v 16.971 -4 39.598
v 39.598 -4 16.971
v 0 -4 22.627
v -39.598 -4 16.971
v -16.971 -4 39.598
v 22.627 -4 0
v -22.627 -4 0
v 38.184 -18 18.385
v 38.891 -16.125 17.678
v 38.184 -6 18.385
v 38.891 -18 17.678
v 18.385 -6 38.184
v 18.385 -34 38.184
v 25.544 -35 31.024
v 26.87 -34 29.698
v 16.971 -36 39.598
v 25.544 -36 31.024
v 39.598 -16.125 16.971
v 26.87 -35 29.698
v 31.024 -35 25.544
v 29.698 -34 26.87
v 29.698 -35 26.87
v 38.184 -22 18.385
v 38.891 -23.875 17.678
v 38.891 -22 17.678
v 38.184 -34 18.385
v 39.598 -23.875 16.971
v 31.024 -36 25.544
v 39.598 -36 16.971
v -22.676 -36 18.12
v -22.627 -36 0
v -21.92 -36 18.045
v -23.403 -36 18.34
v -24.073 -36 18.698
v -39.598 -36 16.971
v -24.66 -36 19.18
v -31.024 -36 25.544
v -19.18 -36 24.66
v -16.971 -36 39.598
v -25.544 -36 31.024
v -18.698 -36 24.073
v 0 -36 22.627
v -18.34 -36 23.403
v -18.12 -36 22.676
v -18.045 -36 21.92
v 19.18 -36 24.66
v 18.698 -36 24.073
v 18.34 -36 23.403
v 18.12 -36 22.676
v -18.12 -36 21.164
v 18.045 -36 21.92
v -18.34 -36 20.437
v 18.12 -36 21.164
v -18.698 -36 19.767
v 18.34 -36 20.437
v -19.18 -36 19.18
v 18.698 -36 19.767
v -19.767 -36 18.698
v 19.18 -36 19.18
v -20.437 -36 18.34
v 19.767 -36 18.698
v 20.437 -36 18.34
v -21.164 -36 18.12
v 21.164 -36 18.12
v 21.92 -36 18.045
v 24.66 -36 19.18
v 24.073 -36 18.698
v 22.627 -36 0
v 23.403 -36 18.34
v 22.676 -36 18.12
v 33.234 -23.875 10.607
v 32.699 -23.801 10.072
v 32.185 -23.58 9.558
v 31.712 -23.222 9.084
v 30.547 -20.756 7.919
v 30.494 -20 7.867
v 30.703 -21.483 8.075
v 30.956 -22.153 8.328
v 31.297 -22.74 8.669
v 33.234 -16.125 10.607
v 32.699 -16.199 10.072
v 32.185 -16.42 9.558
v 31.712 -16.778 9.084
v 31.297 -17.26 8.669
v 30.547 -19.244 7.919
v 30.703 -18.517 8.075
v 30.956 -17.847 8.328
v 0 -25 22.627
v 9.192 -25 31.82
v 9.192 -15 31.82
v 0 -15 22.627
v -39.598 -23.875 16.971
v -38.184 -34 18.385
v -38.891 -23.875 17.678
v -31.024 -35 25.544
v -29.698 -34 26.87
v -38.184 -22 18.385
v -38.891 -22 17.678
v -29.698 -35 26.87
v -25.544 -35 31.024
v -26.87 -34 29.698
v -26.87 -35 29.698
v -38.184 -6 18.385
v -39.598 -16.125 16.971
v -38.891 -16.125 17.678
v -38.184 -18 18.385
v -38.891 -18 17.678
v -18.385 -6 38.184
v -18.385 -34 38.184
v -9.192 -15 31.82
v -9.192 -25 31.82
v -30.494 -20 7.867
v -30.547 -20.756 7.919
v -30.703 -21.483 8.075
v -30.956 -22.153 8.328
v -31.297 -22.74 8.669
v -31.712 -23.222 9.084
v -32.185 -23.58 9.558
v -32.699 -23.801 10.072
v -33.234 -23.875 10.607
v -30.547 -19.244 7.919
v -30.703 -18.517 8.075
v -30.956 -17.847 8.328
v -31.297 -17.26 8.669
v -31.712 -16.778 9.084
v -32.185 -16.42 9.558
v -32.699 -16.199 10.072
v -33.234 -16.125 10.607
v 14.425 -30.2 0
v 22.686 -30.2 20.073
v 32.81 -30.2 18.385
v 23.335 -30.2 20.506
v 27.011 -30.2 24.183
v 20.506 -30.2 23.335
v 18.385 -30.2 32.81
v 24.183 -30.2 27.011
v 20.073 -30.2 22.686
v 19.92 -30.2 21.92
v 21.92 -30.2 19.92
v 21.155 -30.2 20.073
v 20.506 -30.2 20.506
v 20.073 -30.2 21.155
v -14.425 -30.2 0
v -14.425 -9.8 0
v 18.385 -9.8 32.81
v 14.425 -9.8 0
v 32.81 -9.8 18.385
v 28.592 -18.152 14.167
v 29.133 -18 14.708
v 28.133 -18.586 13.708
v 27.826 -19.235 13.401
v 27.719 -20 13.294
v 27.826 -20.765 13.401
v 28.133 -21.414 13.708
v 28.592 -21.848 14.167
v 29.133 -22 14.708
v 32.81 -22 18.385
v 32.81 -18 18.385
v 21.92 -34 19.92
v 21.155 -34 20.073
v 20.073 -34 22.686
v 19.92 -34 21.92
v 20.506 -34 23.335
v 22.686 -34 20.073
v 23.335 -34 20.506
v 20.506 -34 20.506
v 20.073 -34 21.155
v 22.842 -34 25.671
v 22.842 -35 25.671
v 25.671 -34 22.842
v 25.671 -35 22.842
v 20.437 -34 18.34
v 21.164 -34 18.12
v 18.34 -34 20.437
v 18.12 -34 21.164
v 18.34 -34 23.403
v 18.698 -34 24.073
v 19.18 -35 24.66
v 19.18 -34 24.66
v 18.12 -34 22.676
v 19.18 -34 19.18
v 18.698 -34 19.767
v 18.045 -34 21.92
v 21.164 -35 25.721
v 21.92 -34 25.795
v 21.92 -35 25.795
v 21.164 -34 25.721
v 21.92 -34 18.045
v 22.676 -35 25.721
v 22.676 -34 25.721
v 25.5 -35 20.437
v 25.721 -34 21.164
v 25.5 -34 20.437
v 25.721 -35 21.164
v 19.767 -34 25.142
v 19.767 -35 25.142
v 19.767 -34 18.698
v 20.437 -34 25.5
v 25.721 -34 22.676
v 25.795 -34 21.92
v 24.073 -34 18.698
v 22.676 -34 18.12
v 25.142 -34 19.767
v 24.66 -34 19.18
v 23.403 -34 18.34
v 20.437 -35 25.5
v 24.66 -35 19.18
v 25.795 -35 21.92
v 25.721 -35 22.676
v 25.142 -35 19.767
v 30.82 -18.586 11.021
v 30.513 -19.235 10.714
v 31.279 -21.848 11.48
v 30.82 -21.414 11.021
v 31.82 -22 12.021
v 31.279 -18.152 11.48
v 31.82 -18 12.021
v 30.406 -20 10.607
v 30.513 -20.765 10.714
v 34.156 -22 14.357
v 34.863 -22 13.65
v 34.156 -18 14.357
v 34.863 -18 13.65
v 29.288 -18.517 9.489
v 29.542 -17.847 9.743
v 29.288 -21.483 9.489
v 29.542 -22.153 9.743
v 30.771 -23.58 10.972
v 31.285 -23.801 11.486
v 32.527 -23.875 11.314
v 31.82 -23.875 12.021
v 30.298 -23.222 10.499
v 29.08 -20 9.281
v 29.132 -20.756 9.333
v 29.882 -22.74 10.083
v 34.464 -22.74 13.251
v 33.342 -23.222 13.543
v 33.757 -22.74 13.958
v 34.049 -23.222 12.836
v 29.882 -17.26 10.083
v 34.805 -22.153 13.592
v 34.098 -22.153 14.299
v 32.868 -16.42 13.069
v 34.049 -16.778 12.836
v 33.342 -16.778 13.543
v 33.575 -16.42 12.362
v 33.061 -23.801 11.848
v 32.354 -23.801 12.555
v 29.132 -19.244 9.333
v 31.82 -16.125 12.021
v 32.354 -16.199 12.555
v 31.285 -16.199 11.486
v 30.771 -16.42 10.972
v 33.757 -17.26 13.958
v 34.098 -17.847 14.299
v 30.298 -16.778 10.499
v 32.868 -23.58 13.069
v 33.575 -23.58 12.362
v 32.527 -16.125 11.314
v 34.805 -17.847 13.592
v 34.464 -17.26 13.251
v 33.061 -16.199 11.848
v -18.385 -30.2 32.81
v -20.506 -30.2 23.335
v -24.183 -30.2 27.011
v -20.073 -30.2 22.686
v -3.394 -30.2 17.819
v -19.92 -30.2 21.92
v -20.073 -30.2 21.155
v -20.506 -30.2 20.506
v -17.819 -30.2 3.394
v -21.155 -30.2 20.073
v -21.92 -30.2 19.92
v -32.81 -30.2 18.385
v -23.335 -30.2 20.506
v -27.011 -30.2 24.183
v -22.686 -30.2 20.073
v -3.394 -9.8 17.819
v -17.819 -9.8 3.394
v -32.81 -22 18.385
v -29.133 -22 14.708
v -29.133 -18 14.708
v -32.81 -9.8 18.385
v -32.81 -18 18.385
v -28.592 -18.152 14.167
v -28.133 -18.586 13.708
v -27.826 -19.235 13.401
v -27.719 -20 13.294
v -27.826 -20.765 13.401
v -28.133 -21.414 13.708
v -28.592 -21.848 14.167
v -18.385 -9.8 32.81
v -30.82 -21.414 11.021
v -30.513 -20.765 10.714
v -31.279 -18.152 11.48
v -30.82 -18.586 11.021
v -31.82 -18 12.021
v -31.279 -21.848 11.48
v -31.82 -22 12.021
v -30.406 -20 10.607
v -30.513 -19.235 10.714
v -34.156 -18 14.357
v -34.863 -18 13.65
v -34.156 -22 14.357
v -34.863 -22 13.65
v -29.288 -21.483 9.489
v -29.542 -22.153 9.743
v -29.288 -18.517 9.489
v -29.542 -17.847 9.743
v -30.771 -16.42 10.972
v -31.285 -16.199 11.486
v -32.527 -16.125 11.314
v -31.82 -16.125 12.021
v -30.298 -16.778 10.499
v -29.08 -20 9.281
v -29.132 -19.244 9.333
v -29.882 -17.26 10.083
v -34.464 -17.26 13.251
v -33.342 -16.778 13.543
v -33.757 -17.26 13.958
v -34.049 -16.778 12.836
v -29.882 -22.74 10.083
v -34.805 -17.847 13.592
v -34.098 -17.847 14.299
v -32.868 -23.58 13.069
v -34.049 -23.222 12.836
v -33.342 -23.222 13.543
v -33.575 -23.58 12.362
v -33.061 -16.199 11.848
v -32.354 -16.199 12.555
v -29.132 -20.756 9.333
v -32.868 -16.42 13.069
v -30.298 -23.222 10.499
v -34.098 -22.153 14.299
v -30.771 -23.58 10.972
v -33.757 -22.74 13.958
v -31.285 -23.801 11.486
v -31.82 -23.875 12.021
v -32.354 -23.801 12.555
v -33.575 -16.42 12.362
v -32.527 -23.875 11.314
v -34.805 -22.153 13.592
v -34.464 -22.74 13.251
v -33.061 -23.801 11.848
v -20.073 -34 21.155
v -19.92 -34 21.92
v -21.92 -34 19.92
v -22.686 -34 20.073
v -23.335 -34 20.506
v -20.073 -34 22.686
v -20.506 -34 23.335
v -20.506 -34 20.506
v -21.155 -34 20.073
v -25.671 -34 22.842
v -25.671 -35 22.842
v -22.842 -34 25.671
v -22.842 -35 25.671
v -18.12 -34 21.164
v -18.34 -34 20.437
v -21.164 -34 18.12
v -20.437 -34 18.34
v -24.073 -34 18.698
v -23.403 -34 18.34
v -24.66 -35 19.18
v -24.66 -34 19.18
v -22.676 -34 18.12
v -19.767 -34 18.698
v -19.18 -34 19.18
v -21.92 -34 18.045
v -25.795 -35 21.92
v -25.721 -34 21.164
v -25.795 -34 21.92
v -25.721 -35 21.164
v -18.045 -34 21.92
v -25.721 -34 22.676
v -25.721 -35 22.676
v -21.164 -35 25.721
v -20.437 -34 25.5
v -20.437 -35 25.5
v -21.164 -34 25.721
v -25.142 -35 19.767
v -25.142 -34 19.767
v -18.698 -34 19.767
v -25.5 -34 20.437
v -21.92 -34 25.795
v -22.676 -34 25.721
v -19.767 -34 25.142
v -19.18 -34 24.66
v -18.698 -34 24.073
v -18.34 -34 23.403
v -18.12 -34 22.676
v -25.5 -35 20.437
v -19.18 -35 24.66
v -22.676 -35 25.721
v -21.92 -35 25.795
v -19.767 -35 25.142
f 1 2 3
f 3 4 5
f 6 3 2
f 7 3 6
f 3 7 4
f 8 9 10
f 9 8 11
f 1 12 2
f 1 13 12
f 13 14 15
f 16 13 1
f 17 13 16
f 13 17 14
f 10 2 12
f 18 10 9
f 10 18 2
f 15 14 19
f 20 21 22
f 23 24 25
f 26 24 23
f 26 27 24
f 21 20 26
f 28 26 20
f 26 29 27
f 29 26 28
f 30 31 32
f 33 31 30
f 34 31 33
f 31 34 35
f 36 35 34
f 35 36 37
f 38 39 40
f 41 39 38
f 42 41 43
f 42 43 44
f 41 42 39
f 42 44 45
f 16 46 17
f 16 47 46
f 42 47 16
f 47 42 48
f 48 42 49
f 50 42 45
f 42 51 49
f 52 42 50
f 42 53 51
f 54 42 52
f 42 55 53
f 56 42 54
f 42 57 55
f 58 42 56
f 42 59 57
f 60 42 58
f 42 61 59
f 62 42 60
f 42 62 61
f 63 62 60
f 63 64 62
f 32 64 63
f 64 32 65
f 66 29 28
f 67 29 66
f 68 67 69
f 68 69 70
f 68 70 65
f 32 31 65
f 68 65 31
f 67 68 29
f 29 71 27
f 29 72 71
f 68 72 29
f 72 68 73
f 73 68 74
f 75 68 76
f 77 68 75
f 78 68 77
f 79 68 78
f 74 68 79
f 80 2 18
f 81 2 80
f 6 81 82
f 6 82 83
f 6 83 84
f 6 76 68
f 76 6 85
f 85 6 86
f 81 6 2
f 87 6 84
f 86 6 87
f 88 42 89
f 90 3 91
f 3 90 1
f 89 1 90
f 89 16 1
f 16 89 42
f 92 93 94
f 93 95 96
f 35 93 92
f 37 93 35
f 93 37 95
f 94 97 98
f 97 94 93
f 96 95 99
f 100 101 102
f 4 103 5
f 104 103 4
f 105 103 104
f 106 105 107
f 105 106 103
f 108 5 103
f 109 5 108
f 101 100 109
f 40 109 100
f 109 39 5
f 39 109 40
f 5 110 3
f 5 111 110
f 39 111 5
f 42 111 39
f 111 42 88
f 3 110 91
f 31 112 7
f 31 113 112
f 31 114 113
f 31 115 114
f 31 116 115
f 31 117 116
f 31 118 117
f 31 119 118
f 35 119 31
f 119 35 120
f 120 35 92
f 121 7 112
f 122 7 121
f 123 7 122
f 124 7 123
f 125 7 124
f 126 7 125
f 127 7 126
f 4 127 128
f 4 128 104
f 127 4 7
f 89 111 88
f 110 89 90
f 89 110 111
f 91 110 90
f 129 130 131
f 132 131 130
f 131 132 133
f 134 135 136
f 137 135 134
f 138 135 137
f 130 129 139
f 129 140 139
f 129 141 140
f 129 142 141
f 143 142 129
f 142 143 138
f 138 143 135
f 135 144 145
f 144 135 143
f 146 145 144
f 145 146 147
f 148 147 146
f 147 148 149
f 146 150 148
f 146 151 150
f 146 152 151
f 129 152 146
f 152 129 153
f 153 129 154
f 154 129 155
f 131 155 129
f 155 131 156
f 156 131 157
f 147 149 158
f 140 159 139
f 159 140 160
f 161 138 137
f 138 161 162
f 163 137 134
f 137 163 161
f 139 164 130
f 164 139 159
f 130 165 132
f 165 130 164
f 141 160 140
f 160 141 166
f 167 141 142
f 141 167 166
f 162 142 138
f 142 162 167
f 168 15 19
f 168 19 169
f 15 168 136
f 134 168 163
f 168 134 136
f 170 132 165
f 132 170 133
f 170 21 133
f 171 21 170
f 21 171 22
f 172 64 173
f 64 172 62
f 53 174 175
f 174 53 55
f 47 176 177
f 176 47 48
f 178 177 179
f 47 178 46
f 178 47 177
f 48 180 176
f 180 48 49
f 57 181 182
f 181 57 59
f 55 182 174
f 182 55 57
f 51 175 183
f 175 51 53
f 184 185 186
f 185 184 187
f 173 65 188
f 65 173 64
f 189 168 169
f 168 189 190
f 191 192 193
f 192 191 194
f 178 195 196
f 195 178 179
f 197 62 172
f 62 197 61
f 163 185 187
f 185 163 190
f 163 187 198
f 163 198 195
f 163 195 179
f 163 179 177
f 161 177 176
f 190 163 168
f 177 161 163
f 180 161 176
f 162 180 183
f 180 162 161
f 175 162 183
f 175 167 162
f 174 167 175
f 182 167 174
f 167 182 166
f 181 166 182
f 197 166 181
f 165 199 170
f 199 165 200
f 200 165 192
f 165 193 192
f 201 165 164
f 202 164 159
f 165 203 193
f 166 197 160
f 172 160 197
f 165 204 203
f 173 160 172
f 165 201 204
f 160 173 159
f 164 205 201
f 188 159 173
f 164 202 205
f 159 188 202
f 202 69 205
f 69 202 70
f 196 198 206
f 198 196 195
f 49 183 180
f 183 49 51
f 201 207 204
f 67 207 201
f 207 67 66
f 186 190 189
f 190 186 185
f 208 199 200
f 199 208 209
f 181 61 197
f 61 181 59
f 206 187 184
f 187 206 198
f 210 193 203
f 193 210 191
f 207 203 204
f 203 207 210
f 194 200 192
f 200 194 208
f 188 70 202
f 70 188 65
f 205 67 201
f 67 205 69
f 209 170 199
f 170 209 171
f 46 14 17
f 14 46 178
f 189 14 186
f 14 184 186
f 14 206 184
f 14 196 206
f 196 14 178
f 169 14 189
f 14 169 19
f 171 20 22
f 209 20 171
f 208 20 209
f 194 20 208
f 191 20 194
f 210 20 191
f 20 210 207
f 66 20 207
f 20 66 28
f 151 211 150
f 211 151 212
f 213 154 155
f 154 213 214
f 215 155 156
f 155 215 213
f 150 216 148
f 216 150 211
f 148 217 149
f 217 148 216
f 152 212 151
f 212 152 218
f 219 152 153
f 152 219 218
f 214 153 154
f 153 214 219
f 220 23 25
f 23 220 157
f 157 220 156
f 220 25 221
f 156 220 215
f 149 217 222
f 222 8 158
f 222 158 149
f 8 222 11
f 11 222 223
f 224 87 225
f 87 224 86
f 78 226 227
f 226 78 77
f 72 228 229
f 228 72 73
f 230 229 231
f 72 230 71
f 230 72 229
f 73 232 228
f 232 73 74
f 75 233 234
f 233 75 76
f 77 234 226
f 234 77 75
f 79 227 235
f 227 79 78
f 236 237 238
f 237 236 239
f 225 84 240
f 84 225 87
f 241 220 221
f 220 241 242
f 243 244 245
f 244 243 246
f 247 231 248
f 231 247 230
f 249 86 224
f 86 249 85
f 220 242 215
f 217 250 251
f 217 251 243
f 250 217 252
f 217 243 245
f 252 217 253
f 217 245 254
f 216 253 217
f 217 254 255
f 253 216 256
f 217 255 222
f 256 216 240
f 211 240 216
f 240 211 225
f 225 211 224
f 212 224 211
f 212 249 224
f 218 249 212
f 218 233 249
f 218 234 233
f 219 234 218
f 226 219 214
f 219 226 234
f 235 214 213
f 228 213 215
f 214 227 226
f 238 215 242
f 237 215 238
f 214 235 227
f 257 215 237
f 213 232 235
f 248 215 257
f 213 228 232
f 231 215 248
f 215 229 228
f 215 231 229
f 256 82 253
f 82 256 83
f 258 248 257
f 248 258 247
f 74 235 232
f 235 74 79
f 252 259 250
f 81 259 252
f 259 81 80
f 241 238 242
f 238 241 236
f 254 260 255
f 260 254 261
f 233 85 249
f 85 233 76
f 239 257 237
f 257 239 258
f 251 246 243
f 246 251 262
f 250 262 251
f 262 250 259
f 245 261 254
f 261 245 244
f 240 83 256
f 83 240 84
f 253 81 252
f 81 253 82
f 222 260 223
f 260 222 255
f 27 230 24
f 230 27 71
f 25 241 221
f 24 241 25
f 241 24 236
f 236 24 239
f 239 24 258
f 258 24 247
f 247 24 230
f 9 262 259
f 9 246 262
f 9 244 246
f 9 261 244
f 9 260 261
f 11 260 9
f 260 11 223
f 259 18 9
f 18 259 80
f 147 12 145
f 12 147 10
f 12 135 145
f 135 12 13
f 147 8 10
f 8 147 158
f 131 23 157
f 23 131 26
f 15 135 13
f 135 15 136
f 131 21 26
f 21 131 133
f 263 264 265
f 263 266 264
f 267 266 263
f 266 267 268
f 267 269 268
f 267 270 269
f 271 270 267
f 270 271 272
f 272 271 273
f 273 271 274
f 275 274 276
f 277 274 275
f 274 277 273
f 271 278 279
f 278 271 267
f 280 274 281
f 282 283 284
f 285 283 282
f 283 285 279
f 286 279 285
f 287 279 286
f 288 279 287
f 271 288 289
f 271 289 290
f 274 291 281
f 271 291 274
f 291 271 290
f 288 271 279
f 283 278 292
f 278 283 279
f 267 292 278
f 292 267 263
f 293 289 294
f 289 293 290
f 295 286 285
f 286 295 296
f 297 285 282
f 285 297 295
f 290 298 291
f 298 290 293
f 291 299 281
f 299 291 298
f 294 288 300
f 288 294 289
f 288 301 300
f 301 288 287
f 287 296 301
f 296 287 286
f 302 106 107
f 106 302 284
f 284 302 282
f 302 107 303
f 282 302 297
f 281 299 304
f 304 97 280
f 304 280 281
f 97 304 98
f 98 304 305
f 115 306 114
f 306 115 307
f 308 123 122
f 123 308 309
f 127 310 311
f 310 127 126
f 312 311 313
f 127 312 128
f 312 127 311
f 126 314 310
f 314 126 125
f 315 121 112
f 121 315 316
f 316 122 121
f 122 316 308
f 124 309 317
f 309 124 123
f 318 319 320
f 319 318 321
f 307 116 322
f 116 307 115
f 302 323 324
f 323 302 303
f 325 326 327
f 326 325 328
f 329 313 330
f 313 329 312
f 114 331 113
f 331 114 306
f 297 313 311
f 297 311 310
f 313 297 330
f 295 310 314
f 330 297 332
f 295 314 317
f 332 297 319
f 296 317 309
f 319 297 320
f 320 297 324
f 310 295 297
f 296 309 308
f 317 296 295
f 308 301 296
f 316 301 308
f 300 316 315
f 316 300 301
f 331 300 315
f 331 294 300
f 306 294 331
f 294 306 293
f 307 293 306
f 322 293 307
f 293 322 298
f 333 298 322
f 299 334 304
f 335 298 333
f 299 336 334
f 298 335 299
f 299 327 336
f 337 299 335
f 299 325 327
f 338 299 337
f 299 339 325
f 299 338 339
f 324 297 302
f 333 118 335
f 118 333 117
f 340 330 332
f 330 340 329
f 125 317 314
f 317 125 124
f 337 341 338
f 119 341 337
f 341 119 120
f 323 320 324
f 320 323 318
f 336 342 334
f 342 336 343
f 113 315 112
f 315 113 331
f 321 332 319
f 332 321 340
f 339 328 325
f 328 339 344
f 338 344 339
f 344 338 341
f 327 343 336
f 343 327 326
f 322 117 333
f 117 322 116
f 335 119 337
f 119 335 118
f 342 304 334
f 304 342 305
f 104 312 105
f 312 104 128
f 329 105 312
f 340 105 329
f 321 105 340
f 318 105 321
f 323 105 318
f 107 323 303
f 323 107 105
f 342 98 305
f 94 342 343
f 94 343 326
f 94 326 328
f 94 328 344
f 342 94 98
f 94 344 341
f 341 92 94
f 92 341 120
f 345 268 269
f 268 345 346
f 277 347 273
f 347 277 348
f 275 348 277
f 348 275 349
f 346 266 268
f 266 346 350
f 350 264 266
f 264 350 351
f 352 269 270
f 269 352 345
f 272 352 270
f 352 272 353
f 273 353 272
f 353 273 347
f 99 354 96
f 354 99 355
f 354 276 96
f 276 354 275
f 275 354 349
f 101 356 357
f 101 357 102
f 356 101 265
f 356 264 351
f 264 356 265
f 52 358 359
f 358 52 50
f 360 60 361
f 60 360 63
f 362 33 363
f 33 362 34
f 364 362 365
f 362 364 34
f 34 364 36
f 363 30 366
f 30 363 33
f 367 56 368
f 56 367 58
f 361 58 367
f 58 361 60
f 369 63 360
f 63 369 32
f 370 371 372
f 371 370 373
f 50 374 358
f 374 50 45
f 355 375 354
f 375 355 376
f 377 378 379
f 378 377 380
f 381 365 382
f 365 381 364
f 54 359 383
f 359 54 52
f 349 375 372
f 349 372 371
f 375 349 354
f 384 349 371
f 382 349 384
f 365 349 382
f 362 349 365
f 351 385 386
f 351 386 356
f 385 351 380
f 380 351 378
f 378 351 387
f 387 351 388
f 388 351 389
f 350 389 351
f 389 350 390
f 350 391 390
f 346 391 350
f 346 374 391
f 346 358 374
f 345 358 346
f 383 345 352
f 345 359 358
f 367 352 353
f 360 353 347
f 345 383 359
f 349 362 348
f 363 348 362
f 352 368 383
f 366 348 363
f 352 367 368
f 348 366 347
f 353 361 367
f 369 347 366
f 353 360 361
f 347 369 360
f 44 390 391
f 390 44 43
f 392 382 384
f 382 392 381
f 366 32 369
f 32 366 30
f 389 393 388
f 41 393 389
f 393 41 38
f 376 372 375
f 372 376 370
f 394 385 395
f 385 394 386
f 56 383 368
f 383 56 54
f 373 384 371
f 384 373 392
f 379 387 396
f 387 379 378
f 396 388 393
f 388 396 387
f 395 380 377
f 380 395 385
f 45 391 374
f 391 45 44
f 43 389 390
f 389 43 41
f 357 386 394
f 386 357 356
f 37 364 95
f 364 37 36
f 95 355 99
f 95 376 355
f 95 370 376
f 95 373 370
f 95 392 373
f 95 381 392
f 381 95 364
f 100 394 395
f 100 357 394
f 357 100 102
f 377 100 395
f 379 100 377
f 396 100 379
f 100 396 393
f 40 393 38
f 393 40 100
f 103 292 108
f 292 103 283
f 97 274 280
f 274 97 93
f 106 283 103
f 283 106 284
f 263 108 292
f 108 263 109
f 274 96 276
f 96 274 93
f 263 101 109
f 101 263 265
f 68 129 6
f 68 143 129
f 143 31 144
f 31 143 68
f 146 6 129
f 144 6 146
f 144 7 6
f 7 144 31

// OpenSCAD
// Generated by SolidPython 1.1.3 on 2024-01-27 17:47:54


difference() {
	rotate(a = 90, v = [1, 0, 0]) {
		rotate(a = 45, v = [0, 0, 1]) {
			difference() {
				union() {
					union();
					translate(v = [-20, 0, 20]) {
						rotate(a = [0, 90.0, 0.0]) {
							translate(v = [0, 0, 30.0]) {
								cube(center = true, size = [32.0000000000, 32.0000000000, 60.0]);
							}
						}
					}
					translate(v = [0, 15, 20]) {
						rotate(a = [0, 90.0, 90.0]) {
							translate(v = [0, 0, 12.5]) {
								cube(center = true, size = [32.0000000000, 32.0000000000, 25.0]);
							}
						}
					}
					union() {
						union();
						hull() {
							union() {
								translate(v = [-20, 0, 20]) {
									rotate(a = [0, 90.0, 0.0]) {
										translate(v = [0, 0, 30.0]) {
											cube(center = true, size = [10, 10, 60.0]);
										}
									}
								}
								translate(v = [0, 15, 20]) {
									rotate(a = [0, 90.0, 90.0]) {
										translate(v = [0, 0, 12.5]) {
											cube(center = true, size = [10, 10, 25.0]);
										}
									}
								}
							}
						}
					}
				}
				union() {
					union();
					translate(v = [-20, 0, 20]) {
						rotate(a = [0, 90.0, 0.0]) {
							translate(v = [0, 0, 10]) {
								rotate(a = -90, v = [0, -1, 0]) {
									rotate(a = 90, v = [0, 0, 1]) {
										union() {
											union();
											translate(v = [0, -10, 0]) {
												rotate(a = -90, v = [1, 0, 0]) {
													polyhedron(convexity = 10, faces = [[0, 1, 4], [1, 5, 4], [1, 2, 5], [2, 6, 5], [2, 3, 6], [3, 7, 6], [3, 0, 7], [0, 4, 7], [3, 2, 1, 0], [4, 5, 6, 7]], points = [[-15.0000000000, 15.0000000000, 0.0000000000], [15.0000000000, 15.0000000000, 0.0000000000], [15.0000000000, -15.0000000000, 0.0000000000], [-15.0000000000, -15.0000000000, 0.0000000000], [0.0000000000, 0.0000000000, 15.0000000000], [0.0000000000, 0.0000000000, 15.0000000000], [0.0000000000, 0.0000000000, 15.0000000000], [0.0000000000, 0.0000000000, 15.0000000000]]);
												}
											}
											translate(v = [0, 41.0, 0]) {
												rotate(a = 180, v = [1, 0, 0]) {
													translate(v = [0, -10, 0]) {
														rotate(a = -90, v = [1, 0, 0]) {
															polyhedron(convexity = 10, faces = [[0, 1, 4], [1, 5, 4], [1, 2, 5], [2, 6, 5], [2, 3, 6], [3, 7, 6], [3, 0, 7], [0, 4, 7], [3, 2, 1, 0], [4, 5, 6, 7]], points = [[-15.0000000000, 15.0000000000, 0.0000000000], [15.0000000000, 15.0000000000, 0.0000000000], [15.0000000000, -15.0000000000, 0.0000000000], [-15.0000000000, -15.0000000000, 0.0000000000], [0.0000000000, 0.0000000000, 15.0000000000], [0.0000000000, 0.0000000000, 15.0000000000], [0.0000000000, 0.0000000000, 15.0000000000], [0.0000000000, 0.0000000000, 15.0000000000]]);
														}
													}
												}
											}
											translate(v = [0, -10, 0]) {
												rotate(a = -90, v = [1, 0, 0]) {
													union() {
														polyhedron(convexity = 10, faces = [[0, 1, 5], [1, 6, 5], [1, 2, 6], [2, 7, 6], [2, 3, 7], [3, 8, 7], [3, 4, 8], [4, 9, 8], [4, 0, 9], [0, 5, 9], [4, 3, 2, 1, 0], [5, 6, 7, 8, 9]], points = [[-10.2, 10.2, 0.0], [-10.2, 0.0, 0.0], [-4.3999999999999995, 0.0, 0.0], [-4.3999999999999995, 0.0, 0.0], [0.0, 0.0, 0.0], [-10.2, 10.2, 60.0], [-10.2, 0.0, 60.0], [-4.3999999999999995, 0.0, 60.0], [-4.3999999999999995, 0.0, 60.0], [0.0, 0.0, 60.0]]);
														mirror(v = [0, 1]) {
															polyhedron(convexity = 10, faces = [[0, 1, 5], [1, 6, 5], [1, 2, 6], [2, 7, 6], [2, 3, 7], [3, 8, 7], [3, 4, 8], [4, 9, 8], [4, 0, 9], [0, 5, 9], [4, 3, 2, 1, 0], [5, 6, 7, 8, 9]], points = [[-10.2, 10.2, 0.0], [-10.2, 0.0, 0.0], [-4.3999999999999995, 0.0, 0.0], [-4.3999999999999995, 0.0, 0.0], [0.0, 0.0, 0.0], [-10.2, 10.2, 60.0], [-10.2, 0.0, 60.0], [-4.3999999999999995, 0.0, 60.0], [-4.3999999999999995, 0.0, 60.0], [0.0, 0.0, 60.0]]);
														}
														mirror(v = [1, 1]) {
															union() {
																polyhedron(convexity = 10, faces = [[0, 1, 5], [1, 6, 5], [1, 2, 6], [2, 7, 6], [2, 3, 7], [3, 8, 7], [3, 4, 8], [4, 9, 8], [4, 0, 9], [0, 5, 9], [4, 3, 2, 1, 0], [5, 6, 7, 8, 9]], points = [[-10.2, 10.2, 0.0], [-10.2, 0.0, 0.0], [-4.3999999999999995, 0.0, 0.0], [-4.3999999999999995, 0.0, 0.0], [0.0, 0.0, 0.0], [-10.2, 10.2, 60.0], [-10.2, 0.0, 60.0], [-4.3999999999999995, 0.0, 60.0], [-4.3999999999999995, 0.0, 60.0], [0.0, 0.0, 60.0]]);
																mirror(v = [0, 1]) {
																	polyhedron(convexity = 10, faces = [[0, 1, 5], [1, 6, 5], [1, 2, 6], [2, 7, 6], [2, 3, 7], [3, 8, 7], [3, 4, 8], [4, 9, 8], [4, 0, 9], [0, 5, 9], [4, 3, 2, 1, 0], [5, 6, 7, 8, 9]], points = [[-10.2, 10.2, 0.0], [-10.2, 0.0, 0.0], [-4.3999999999999995, 0.0, 0.0], [-4.3999999999999995, 0.0, 0.0], [0.0, 0.0, 0.0], [-10.2, 10.2, 60.0], [-10.2, 0.0, 60.0], [-4.3999999999999995, 0.0, 60.0], [-4.3999999999999995, 0.0, 60.0], [0.0, 0.0, 60.0]]);
																}
															}
														}
														mirror(v = [1, -1]) {
															union() {
																polyhedron(convexity = 10, faces = [[0, 1, 5], [1, 6, 5], [1, 2, 6], [2, 7, 6], [2, 3, 7], [3, 8, 7], [3, 4, 8], [4, 9, 8], [4, 0, 9], [0, 5, 9], [4, 3, 2, 1, 0], [5, 6, 7, 8, 9]], points = [[-10.2, 10.2, 0.0], [-10.2, 0.0, 0.0], [-4.3999999999999995, 0.0, 0.0], [-4.3999999999999995, 0.0, 0.0], [0.0, 0.0, 0.0], [-10.2, 10.2, 60.0], [-10.2, 0.0, 60.0], [-4.3999999999999995, 0.0, 60.0], [-4.3999999999999995, 0.0, 60.0], [0.0, 0.0, 60.0]]);
																mirror(v = [0, 1]) {
																	polyhedron(convexity = 10, faces = [[0, 1, 5], [1, 6, 5], [1, 2, 6], [2, 7, 6], [2, 3, 7], [3, 8, 7], [3, 4, 8], [4, 9, 8], [4, 0, 9], [0, 5, 9], [4, 3, 2, 1, 0], [5, 6, 7, 8, 9]], points = [[-10.2, 10.2, 0.0], [-10.2, 0.0, 0.0], [-4.3999999999999995, 0.0, 0.0], [-4.3999999999999995, 0.0, 0.0], [0.0, 0.0, 0.0], [-10.2, 10.2, 60.0], [-10.2, 0.0, 60.0], [-4.3999999999999995, 0.0, 60.0], [-4.3999999999999995, 0.0, 60.0], [0.0, 0.0, 60.0]]);
																}
																mirror(v = [1, 1]) {
																	union() {
																		polyhedron(convexity = 10, faces = [[0, 1, 5], [1, 6, 5], [1, 2, 6], [2, 7, 6], [2, 3, 7], [3, 8, 7], [3, 4, 8], [4, 9, 8], [4, 0, 9], [0, 5, 9], [4, 3, 2, 1, 0], [5, 6, 7, 8, 9]], points = [[-10.2, 10.2, 0.0], [-10.2, 0.0, 0.0], [-4.3999999999999995, 0.0, 0.0], [-4.3999999999999995, 0.0, 0.0], [0.0, 0.0, 0.0], [-10.2, 10.2, 60.0], [-10.2, 0.0, 60.0], [-4.3999999999999995, 0.0, 60.0], [-4.3999999999999995, 0.0, 60.0], [0.0, 0.0, 60.0]]);
																		mirror(v = [0, 1]) {
																			polyhedron(convexity = 10, faces = [[0, 1, 5], [1, 6, 5], [1, 2, 6], [2, 7, 6], [2, 3, 7], [3, 8, 7], [3, 4, 8], [4, 9, 8], [4, 0, 9], [0, 5, 9], [4, 3, 2, 1, 0], [5, 6, 7, 8, 9]], points = [[-10.2, 10.2, 0.0], [-10.2, 0.0, 0.0], [-4.3999999999999995, 0.0, 0.0], [-4.3999999999999995, 0.0, 0.0], [0.0, 0.0, 0.0], [-10.2, 10.2, 60.0], [-10.2, 0.0, 60.0], [-4.3999999999999995, 0.0, 60.0], [-4.3999999999999995, 0.0, 60.0], [0.0, 0.0, 60.0]]);
																		}
																	}
																}
															}
														}
													}
												}
											}
											union() {
												union();
												translate(v = [0, 41.0, 0]) {
													rotate(a = 180, v = [1, 0, 0]) {
														union() {
															translate(v = [0, 0, 14]) {
																cylinder($fn = 32, h = 4, r = 3.8750000000);
															}
															translate(v = [-3.8750000000, -12, 15]) {
																cube(size = [7.7500000000, 12, 4]);
															}
															union() {
																cylinder($fn = 16, h = 19, r = 2.0000000000);
																translate(v = [-2.0000000000, -12, 0]) {
																	cube(size = [4, 12, 19]);
																}
															}
															rotate(a = -90, v = [0, 1, 0]) {
																polyhedron(convexity = 10, faces = [[0, 1, 3], [1, 4, 3], [1, 2, 4], [2, 5, 4], [2, 0, 5], [0, 3, 5], [2, 1, 0], [3, 4, 5]], points = [[0.0000000000, -10.0000000000, 0.0000000000], [10.1000000000, -10.0000000000, 10.1000000000], [10.1000000000, -10.0000000000, -10.1000000000], [0.0000000000, 12.0000000000, 0.0000000000], [10.1000000000, 12.0000000000, 10.1000000000], [10.1000000000, 12.0000000000, -10.1000000000]]);
															}
														}
													}
												}
												translate(v = [0, 41.0, 0]) {
													rotate(a = 180, v = [1, 0, 0]) {
														rotate(a = 270, v = [0, 1, 0]) {
															union() {
																translate(v = [0, 0, 14]) {
																	cylinder($fn = 32, h = 4, r = 3.8750000000);
																}
																translate(v = [-3.8750000000, -12, 15]) {
																	cube(size = [7.7500000000, 12, 4]);
																}
																union() {
																	cylinder($fn = 16, h = 19, r = 2.0000000000);
																	translate(v = [-2.0000000000, -12, 0]) {
																		cube(size = [4, 12, 19]);
																	}
																}
																rotate(a = -90, v = [0, 1, 0]) {
																	polyhedron(convexity = 10, faces = [[0, 1, 3], [1, 4, 3], [1, 2, 4], [2, 5, 4], [2, 0, 5], [0, 3, 5], [2, 1, 0], [3, 4, 5]], points = [[0.0000000000, -10.0000000000, 0.0000000000], [10.1000000000, -10.0000000000, 10.1000000000], [10.1000000000, -10.0000000000, -10.1000000000], [0.0000000000, 12.0000000000, 0.0000000000], [10.1000000000, 12.0000000000, 10.1000000000], [10.1000000000, 12.0000000000, -10.1000000000]]);
																}
															}
														}
													}
												}
											}
										}
									}
								}
							}
						}
					}
					translate(v = [0, 15, 20]) {
						rotate(a = [0, 90.0, 90.0]) {
							translate(v = [0, 0, 10]) {
								rotate(a = -90, v = [0, -1, 0]) {
									rotate(a = 90, v = [0, 0, 1]) {
										union() {
											union();
											translate(v = [0, 6.0, 0]) {
												rotate(a = 180, v = [1, 0, 0]) {
													translate(v = [0, -10, 0]) {
														rotate(a = -90, v = [1, 0, 0]) {
															polyhedron(convexity = 10, faces = [[0, 1, 4], [1, 5, 4], [1, 2, 5], [2, 6, 5], [2, 3, 6], [3, 7, 6], [3, 0, 7], [0, 4, 7], [3, 2, 1, 0], [4, 5, 6, 7]], points = [[-15.0000000000, 15.0000000000, 0.0000000000], [15.0000000000, 15.0000000000, 0.0000000000], [15.0000000000, -15.0000000000, 0.0000000000], [-15.0000000000, -15.0000000000, 0.0000000000], [0.0000000000, 0.0000000000, 15.0000000000], [0.0000000000, 0.0000000000, 15.0000000000], [0.0000000000, 0.0000000000, 15.0000000000], [0.0000000000, 0.0000000000, 15.0000000000]]);
														}
													}
												}
											}
											translate(v = [0, -10, 0]) {
												rotate(a = -90, v = [1, 0, 0]) {
													union() {
														polyhedron(convexity = 10, faces = [[0, 1, 5], [1, 6, 5], [1, 2, 6], [2, 7, 6], [2, 3, 7], [3, 8, 7], [3, 4, 8], [4, 9, 8], [4, 0, 9], [0, 5, 9], [4, 3, 2, 1, 0], [5, 6, 7, 8, 9]], points = [[-10.2, 10.2, 0.0], [-10.2, 0.0, 0.0], [-4.3999999999999995, 0.0, 0.0], [-4.3999999999999995, 0.0, 0.0], [0.0, 0.0, 0.0], [-10.2, 10.2, 25.0], [-10.2, 0.0, 25.0], [-4.3999999999999995, 0.0, 25.0], [-4.3999999999999995, 0.0, 25.0], [0.0, 0.0, 25.0]]);
														mirror(v = [0, 1]) {
															polyhedron(convexity = 10, faces = [[0, 1, 5], [1, 6, 5], [1, 2, 6], [2, 7, 6], [2, 3, 7], [3, 8, 7], [3, 4, 8], [4, 9, 8], [4, 0, 9], [0, 5, 9], [4, 3, 2, 1, 0], [5, 6, 7, 8, 9]], points = [[-10.2, 10.2, 0.0], [-10.2, 0.0, 0.0], [-4.3999999999999995, 0.0, 0.0], [-4.3999999999999995, 0.0, 0.0], [0.0, 0.0, 0.0], [-10.2, 10.2, 25.0], [-10.2, 0.0, 25.0], [-4.3999999999999995, 0.0, 25.0], [-4.3999999999999995, 0.0, 25.0], [0.0, 0.0, 25.0]]);
														}
														mirror(v = [1, 1]) {
															union() {
																polyhedron(convexity = 10, faces = [[0, 1, 5], [1, 6, 5], [1, 2, 6], [2, 7, 6], [2, 3, 7], [3, 8, 7], [3, 4, 8], [4, 9, 8], [4, 0, 9], [0, 5, 9], [4, 3, 2, 1, 0], [5, 6, 7, 8, 9]], points = [[-10.2, 10.2, 0.0], [-10.2, 0.0, 0.0], [-4.3999999999999995, 0.0, 0.0], [-4.3999999999999995, 0.0, 0.0], [0.0, 0.0, 0.0], [-10.2, 10.2, 25.0], [-10.2, 0.0, 25.0], [-4.3999999999999995, 0.0, 25.0], [-4.3999999999999995, 0.0, 25.0], [0.0, 0.0, 25.0]]);
																mirror(v = [0, 1]) {
																	polyhedron(convexity = 10, faces = [[0, 1, 5], [1, 6, 5], [1, 2, 6], [2, 7, 6], [2, 3, 7], [3, 8, 7], [3, 4, 8], [4, 9, 8], [4, 0, 9], [0, 5, 9], [4, 3, 2, 1, 0], [5, 6, 7, 8, 9]], points = [[-10.2, 10.2, 0.0], [-10.2, 0.0, 0.0], [-4.3999999999999995, 0.0, 0.0], [-4.3999999999999995, 0.0, 0.0], [0.0, 0.0, 0.0], [-10.2, 10.2, 25.0], [-10.2, 0.0, 25.0], [-4.3999999999999995, 0.0, 25.0], [-4.3999999999999995, 0.0, 25.0], [0.0, 0.0, 25.0]]);
																}
															}
														}
														mirror(v = [1, -1]) {
															union() {
																polyhedron(convexity = 10, faces = [[0, 1, 5], [1, 6, 5], [1, 2, 6], [2, 7, 6], [2, 3, 7], [3, 8, 7], [3, 4, 8], [4, 9, 8], [4, 0, 9], [0, 5, 9], [4, 3, 2, 1, 0], [5, 6, 7, 8, 9]], points = [[-10.2, 10.2, 0.0], [-10.2, 0.0, 0.0], [-4.3999999999999995, 0.0, 0.0], [-4.3999999999999995, 0.0, 0.0], [0.0, 0.0, 0.0], [-10.2, 10.2, 25.0], [-10.2, 0.0, 25.0], [-4.3999999999999995, 0.0, 25.0], [-4.3999999999999995, 0.0, 25.0], [0.0, 0.0, 25.0]]);
																mirror(v = [0, 1]) {
																	polyhedron(convexity = 10, faces = [[0, 1, 5], [1, 6, 5], [1, 2, 6], [2, 7, 6], [2, 3, 7], [3, 8, 7], [3, 4, 8], [4, 9, 8], [4, 0, 9], [0, 5, 9], [4, 3, 2, 1, 0], [5, 6, 7, 8, 9]], points = [[-10.2, 10.2, 0.0], [-10.2, 0.0, 0.0], [-4.3999999999999995, 0.0, 0.0], [-4.3999999999999995, 0.0, 0.0], [0.0, 0.0, 0.0], [-10.2, 10.2, 25.0], [-10.2, 0.0, 25.0], [-4.3999999999999995, 0.0, 25.0], [-4.3999999999999995, 0.0, 25.0], [0.0, 0.0, 25.0]]);
																}
																mirror(v = [1, 1]) {
																	union() {
																		polyhedron(convexity = 10, faces = [[0, 1, 5], [1, 6, 5], [1, 2, 6], [2, 7, 6], [2, 3, 7], [3, 8, 7], [3, 4, 8], [4, 9, 8], [4, 0, 9], [0, 5, 9], [4, 3, 2, 1, 0], [5, 6, 7, 8, 9]], points = [[-10.2, 10.2, 0.0], [-10.2, 0.0, 0.0], [-4.3999999999999995, 0.0, 0.0], [-4.3999999999999995, 0.0, 0.0], [0.0, 0.0, 0.0], [-10.2, 10.2, 25.0], [-10.2, 0.0, 25.0], [-4.3999999999999995, 0.0, 25.0], [-4.3999999999999995, 0.0, 25.0], [0.0, 0.0, 25.0]]);
																		mirror(v = [0, 1]) {
																			polyhedron(convexity = 10, faces = [[0, 1, 5], [1, 6, 5], [1, 2, 6], [2, 7, 6], [2, 3, 7], [3, 8, 7], [3, 4, 8], [4, 9, 8], [4, 0, 9], [0, 5, 9], [4, 3, 2, 1, 0], [5, 6, 7, 8, 9]], points = [[-10.2, 10.2, 0.0], [-10.2, 0.0, 0.0], [-4.3999999999999995, 0.0, 0.0], [-4.3999999999999995, 0.0, 0.0], [0.0, 0.0, 0.0], [-10.2, 10.2, 25.0], [-10.2, 0.0, 25.0], [-4.3999999999999995, 0.0, 25.0], [-4.3999999999999995, 0.0, 25.0], [0.0, 0.0, 25.0]]);
																		}
																	}
																}
															}
														}
													}
												}
											}
											union() {
												union();
												translate(v = [0, 6.0, 0]) {
													rotate(a = 180, v = [1, 0, 0]) {
														rotate(a = 90, v = [0, 1, 0]) {
															union() {
																translate(v = [0, 0, 14]) {
																	cylinder($fn = 32, h = 4, r = 3.8750000000);
																}
																translate(v = [-3.8750000000, -12, 15]) {
																	cube(size = [7.7500000000, 12, 4]);
																}
																union() {
																	cylinder($fn = 16, h = 19, r = 2.0000000000);
																	translate(v = [-2.0000000000, -12, 0]) {
																		cube(size = [4, 12, 19]);
																	}
																}
																rotate(a = -90, v = [0, 1, 0]) {
																	polyhedron(convexity = 10, faces = [[0, 1, 3], [1, 4, 3], [1, 2, 4], [2, 5, 4], [2, 0, 5], [0, 3, 5], [2, 1, 0], [3, 4, 5]], points = [[0.0000000000, -10.0000000000, 0.0000000000], [10.1000000000, -10.0000000000, 10.1000000000], [10.1000000000, -10.0000000000, -10.1000000000], [0.0000000000, 12.0000000000, 0.0000000000], [10.1000000000, 12.0000000000, 10.1000000000], [10.1000000000, 12.0000000000, -10.1000000000]]);
																}
															}
														}
													}
												}
												translate(v = [0, 6.0, 0]) {
													rotate(a = 180, v = [1, 0, 0]) {
														union() {
															translate(v = [0, 0, 14]) {
																cylinder($fn = 32, h = 4, r = 3.8750000000);
															}
															translate(v = [-3.8750000000, -12, 15]) {
																cube(size = [7.7500000000, 12, 4]);
															}
															union() {
																cylinder($fn = 16, h = 19, r = 2.0000000000);
																translate(v = [-2.0000000000, -12, 0]) {
																	cube(size = [4, 12, 19]);
																}
															}
															rotate(a = -90, v = [0, 1, 0]) {
																polyhedron(convexity = 10, faces = [[0, 1, 3], [1, 4, 3], [1, 2, 4], [2, 5, 4], [2, 0, 5], [0, 3, 5], [2, 1, 0], [3, 4, 5]], points = [[0.0000000000, -10.0000000000, 0.0000000000], [10.1000000000, -10.0000000000, 10.1000000000], [10.1000000000, -10.0000000000, -10.1000000000], [0.0000000000, 12.0000000000, 0.0000000000], [10.1000000000, 12.0000000000, 10.1000000000], [10.1000000000, 12.0000000000, -10.1000000000]]);
															}
														}
													}
												}
											}
										}
									}
								}
							}
						}
					}
				}
			}
		}
	}
	translate(v = [0, 0, -150]) {
		cube(center = true, size = [300, 300, 300]);
	}
}
/***********************************************
*********      SolidPython code:      **********
************************************************
 
#! /usr/bin/env python3
import sys
from math import cos, radians, sin, pi, tau
from pathlib import Path

from solid import hull, mirror, scad_render_to_file
from solid.utils import Point3, OpenSCADObject, cube, translate, rotate, extrude_along_path, RIGHT_VEC, FORWARD_VEC, UP_VEC, BACK_VEC, cylinder

from typing import Set, Sequence, List, Callable, Optional, Union, Iterable, Tuple

import numpy as np

class ExtrusionCutouts:
	def __init__(self,e_thickness = 20,tolerance = .2,gap_size = 3,nub_length = 6):
		self.inner_corner = e_thickness/2 + tolerance
		self.nub_length = nub_length - tolerance
		self.gap_size = gap_size - tolerance
		self.e_thickness = e_thickness

	def e_profile(self,inner_fins=False) -> List[Point3]:
		if inner_fins:
			profile_pts = [[self.inner_corner,self.inner_corner,0],
							[self.inner_corner,self.gap_size,0],
							[self.inner_corner - self.nub_length, self.gap_size,0],
							[self.inner_corner - self.nub_length,0,0],[0,0,0]]
		else:
			profile_pts = [[self.inner_corner,self.inner_corner,0],
							[self.inner_corner,0,0],
							[self.inner_corner - self.nub_length, 0,0],
							[self.inner_corner - self.nub_length,0,0],[0,0,0]]			
		return profile_pts

	def extrude_and_mirror_profile(self,e_profile,length,scale) -> OpenSCADObject:
		path = [[0,0,0],[0,0,length]]
		shape = e_profile
		extruded = extrude_along_path( shape_pts=shape, path_pts=path, scales = [1,scale])
		extruded += mirror(v=(0,1))(extruded)
		extruded += mirror(v=(1,1))(extruded)
		extruded += mirror(v=(1,-1))(extruded)
		return extruded

	def cutouts(self,length) -> OpenSCADObject:
		extrusion_offset = 10
		extrusion_profile = self.extrude_and_mirror_profile(self.e_profile(),length+extrusion_offset,1)
		extrusion_profile = translate([0,-extrusion_offset,0])(rotate(-90, v=RIGHT_VEC)(extrusion_profile))
		return extrusion_profile

class Slots:
	def __init__(self,ends = [1,1,1,1,0,0,0,0],e_thickness = 20,tolerance = .2):
		self.e_thickness = e_thickness
		self.ends = ends 
		self.tolerance = tolerance

	def hammer_nut_hole(self) -> OpenSCADObject:
		inset_length = 12
		extrusion_size = self.e_thickness + self.tolerance
		hes = extrusion_size/2
		hammer_nut_pts = [[0,0,0],[hes,hes,0],[hes,-hes,0]]
		hammer_nut_path = [[0,-10,0],[0,inset_length,0]]
		hammer_nut_hole = extrude_along_path(shape_pts=hammer_nut_pts, path_pts=hammer_nut_path)
		hammer_nut_hole = rotate(-90, v=FORWARD_VEC)(hammer_nut_hole)
		shape = hammer_nut_hole
		return shape

	def head_slot(self) -> OpenSCADObject:
		head_height = 14
		head_diameter = 7.75
		cyl_sides = 32
		inset_length = 12
		head_hole = translate([0,0,head_height])(cylinder(r = head_diameter/2, h = 4, segments = cyl_sides))
		head_slot = translate([head_diameter/-2,-inset_length,head_height+1])(cube([head_diameter,inset_length,4]))
		shape = head_hole
		shape += head_slot
		return shape

	def screw_slot(self) -> OpenSCADObject:
		screw_diameter = 4
		screw_height = 19
		cyl_sides = 16
		inset_length = 12
		screw_hole = cylinder(r = screw_diameter/2, h = screw_height, segments = cyl_sides) 
		screw_slot = translate([screw_diameter/-2,-inset_length,0])(cube([screw_diameter,inset_length,screw_height]))
		shape = screw_hole
		shape +=  screw_slot
		return shape

	def slot(self) -> OpenSCADObject:
		return self.head_slot() + self.screw_slot() + self.hammer_nut_hole()

	def screw_slots(self,sides = []) -> OpenSCADObject:
		screw_slots = OpenSCADObject()
		screw_slots = slot()
		screw_slots+= rotate(90,v=FORWARD_VEC)(slot())
		screw_slots+= rotate(180,v=FORWARD_VEC)(slot())
		screw_slots+= rotate(270,v=FORWARD_VEC)(slot())
		return screw_slots

	def cutouts(self,length) -> OpenSCADObject:
		cutouts = OpenSCADObject(name="union",params={})
		if self.ends[0]:
			cutouts += rotate(180,v=FORWARD_VEC)(self.slot())
		if self.ends[1]:
			cutouts += rotate(90,v=FORWARD_VEC)(self.slot())
		if self.ends[2]:
			cutouts += self.slot()
		if self.ends[3]:
			cutouts += rotate(270,v=FORWARD_VEC)(self.slot())
		if self.ends[4]:
			cutouts += translate([0,length-9,0])(rotate(180,v=(1,0,0))(( rotate(180,v=FORWARD_VEC)(self.slot()) )))
		if self.ends[5]:
			cutouts += translate([0,length-9,0])(rotate(180,v=(1,0,0))(( rotate(90,v=FORWARD_VEC)(self.slot()) )))
		if self.ends[6]:
			cutouts += translate([0,length-9,0])(rotate(180,v=(1,0,0))((self.slot())))
		if self.ends[7]:
			cutouts += translate([0,length-9,0])(rotate(180,v=(1,0,0))(( rotate(270,v=FORWARD_VEC)(self.slot()) )))
		return cutouts

class EndCutouts:
	def __init__(self,blind_ends = [0,0]):
		self.blind_ends = blind_ends

	def pyramid(self,size = 15) -> OpenSCADObject:
		base_pts = [[size,size,0],[-size,size,0],[-size,-size,0],[size,-size,0]]
		path_pts = [[0,0,0],[0,0,size]]
		pyramid =  extrude_along_path(shape_pts = base_pts, path_pts = path_pts, scales = [1,0])
		pyramid = rotate(-90,v=RIGHT_VEC)(pyramid())
		pyramid = translate([0,-10,0])(pyramid)
		return pyramid

	def cutouts(self,length) -> OpenSCADObject:
		cutouts = OpenSCADObject(name="union",params={})
		if self.blind_ends[0]:
			cutouts += self.pyramid(15)
		if self.blind_ends[1]:
			cutouts += translate([0,length-9,0])(rotate(180,v=(1,0,0))(( self.pyramid(15) )))
		return cutouts 


class Cutout:
	instances = []
	def __init__(self,start_pt = [-60,0,0],end_pt = [60,0,0],ends = [1,1,1,1,0,0,0,0],blind_ends = [0,0]):
		self.start_pt = start_pt
		self.end_pt = end_pt
		self.ends = ends
		self.blind_ends = blind_ends
		Cutout.instances.append(self)

	def cutouts(self,length = 100) -> OpenSCADObject:
		cutouts = EndCutouts(self.blind_ends).cutouts(length)
		cutouts += ExtrusionCutouts().cutouts(length)
		cutouts += Slots(self.ends).cutouts(length)

		cutouts = rotate(90,v=UP_VEC)(cutouts)
		return cutouts

	def cutout_pos(self) -> OpenSCADObject:
		offset = 10
		if type(self.start_pt) == list:
			self.start_pt = np.array(self.start_pt)
		if type(self.end_pt) == list:
			self.end_pt = np.array(self.end_pt)
		norm_v = self.end_pt - self.start_pt
		length = np.linalg.norm(norm_v)
		cube_shell = (self.cutouts(length = length - offset))
		cube_shell = rotate(-90,BACK_VEC)(cube_shell)
		cube_shell = translate([0,0,offset])(cube_shell)
		x = norm_v[0]
		y = norm_v[1]
		z = norm_v[2]
		b = np.degrees(np.arccos(z/length))
		c = np.degrees(np.arctan2(y,x))
		cube_shell = rotate([0,b,c])(cube_shell)

		x = self.start_pt[0]
		y = self.start_pt[1]
		z = self.start_pt[2]
		cube_shell = translate([x,y,z])(cube_shell)

		return cube_shell

	def union_all_cutouts() -> OpenSCADObject:
		all_cutouts = OpenSCADObject(name="union",params={})
		for i in Cutout.instances:
			all_cutouts += i.cutout_pos()
		return all_cutouts


class Shell:
	instances = []
	def __init__(self,start_pt,end_pt,shell_thickness = 6,e_thickness = 20):
		self.start_pt = start_pt
		self.end_pt = end_pt
		self.shell_thickness = shell_thickness
		self.e_thickness = e_thickness
		Shell.instances.append(self)

	def make_shell(self,length) -> OpenSCADObject:
		total = (self.e_thickness/2 + self.shell_thickness)*2
		return cube([total, total, length], center=True)

	def shell_pos(self) -> OpenSCADObject:
		cube_shell = Manip.reposition(self.start_pt,self.end_pt,self.make_shell)
		return cube_shell

	def union_all_shells() -> OpenSCADObject:
		all_shells = OpenSCADObject(name="union",params={})
		for i in Shell.instances:
			all_shells += i.shell_pos()
		return all_shells


class Gusset:
	instances = []
	def __init__(self,start_pt_one,end_pt_one,start_pt_two,end_pt_two,thickness= 10):
		self.start_pt_one = start_pt_one
		self.end_pt_one = end_pt_one
		self.start_pt_two = start_pt_two
		self.end_pt_two = end_pt_two
		self.thickness = thickness
		Gusset.instances.append(self)

	def make_stick_one(self,length) -> OpenSCADObject:
		length_one = Manip.get_length(self.start_pt_one,self.end_pt_one)
		stick_one = cube([self.thickness,self.thickness,length_one],center=True)
		return stick_one

	def make_stick_two(self,length) -> OpenSCADObject:
		length_two = Manip.get_length(self.start_pt_two,self.end_pt_two)
		stick_two = cube([self.thickness,self.thickness,length_two],center=True)
		return stick_two

	def gusset_sticks(self) -> OpenSCADObject:
		stick_one = Manip.reposition(self.start_pt_one,self.end_pt_one,self.make_stick_one)
		stick_two = Manip.reposition(self.start_pt_two,self.end_pt_two,self.make_stick_two)
		return stick_one + stick_two

	def hull_gusset(self) -> OpenSCADObject:
		gusset = hull()(self.gusset_sticks())
		return gusset

	def union_all_gussets() -> OpenSCADObject:
		all_gussets = OpenSCADObject(name="union",params={})
		for i in Gusset.instances:
			all_gussets += i.hull_gusset()
		return all_gussets

class Manip:
	def bisect_floor(input) -> OpenSCADObject:
		size = 300
		floor = translate([0,0,-150])(cube([300,300,300],center = True))
		return input - floor

	def get_length(first_pt,second_pt):
		if type(first_pt) == list:
			first_pt = np.array(first_pt)
		if type(second_pt) == list:
			second_pt = np.array(second_pt)
		norm_v = second_pt - first_pt
		return np.linalg.norm(norm_v)

	def reposition(first_pt,second_pt,func) -> OpenSCADObject:
		if type(first_pt) == list:
			first_pt = np.array(first_pt)
		if type(second_pt) == list:
			second_pt = np.array(second_pt)
		norm_v = second_pt - first_pt
		length = np.linalg.norm(norm_v)
		cube_shell = func(length)
		cube_shell = translate([0,0,length/2])(cube_shell)
		x = norm_v[0]
		y = norm_v[1]
		z = norm_v[2]
		b = np.degrees(np.arccos(z/length))
		c = np.degrees(np.arctan2(y,x))
		cube_shell = rotate([0,b,c])(cube_shell)

		x = first_pt[0]
		y = first_pt[1]
		z = first_pt[2]
		cube_shell = translate([x,y,z])(cube_shell)
		return cube_shell

	def balance_on_corner_and_cutoff(a) -> OpenSCADObject:
		a = rotate(a = 45, v=(1,0,0))(a) 
		a = rotate(a = -35.26, v=(0,1,0))(a)
		a = Manip.bisect_floor(a)
		return a

	def balance_on_edge_and_cutoff(a) -> OpenSCADObject:
		a = rotate(a = 45, v=(0,0,1))(a) 
		a = rotate(a = 90, v=(1,0,0))(a) 
		a = Manip.bisect_floor(a)
		return a

class Fittings:
	def __init__(self,e_distance = 40):
		self.e_distance = e_distance

	def corner_three_way(self) -> OpenSCADObject:
		points = [[self.e_distance,0,0],[-16,0,0]],[[0,14,0],[0,self.e_distance,0]],[[0,0,self.e_distance],[0,0,14]]
		center = [0,0,0]

		shell1 = Shell(points[0][0],points[0][1])
		shell2 = Shell(points[1][0],points[1][1])
		shell3 = Shell(points[2][0],points[2][1])
		cutout1 = Cutout(points[0][0],points[0][1],[0,1,1,0,0,0,0,0],[1,0])
		cutout2 = Cutout(points[1][0],points[1][1],[0,0,0,0,1,1,0,0],[0,1])
		cutout3 = Cutout(points[2][0],points[2][1],[0,0,1,1,0,0,0,0],[1,0])

		gusset1 = Gusset(points[1][0],points[1][1],points[2][0],points[2][1])
		gusset2 = Gusset(points[1][0],points[1][1],center,points[0][0])
		gusset3 = Gusset(points[2][0],points[2][1],center,points[0][0])

		a = Fittings.merge_everything(self)
		a = Manip.balance_on_corner_and_cutoff(a)

		return a

	def corner_two_way_diag(self) -> OpenSCADObject:
		points = [[self.e_distance,0,0],[-16,0,0]], \
					[[0,14,0],[0,self.e_distance,0]], \
					[[self.e_distance,self.e_distance,0],[20,20,0]]
		center = [0,0,0]

		shell1 = Shell(points[0][0],points[0][1])
		shell2 = Shell(points[1][0],points[1][1])
		shell3 = Shell(points[2][0],points[2][1])

		cutout1 = Cutout(points[0][0],points[0][1],[0,1,1,0,0,0,0,0],[1,0])
		cutout2 = Cutout(points[1][0],points[1][1],[0,0,0,0,1,1,0,0],[0,1])
		cutout3 = Cutout(points[2][0],points[2][1],[1,1,1,1,0,0,0,0],[1,0])

		gusset2 = Gusset(points[1][0],points[1][1],center,points[0][0])

		a = Fittings.merge_everything(self)
		a = Manip.balance_on_corner_and_cutoff(a)

		return a

	def corner_two_way(self) -> OpenSCADObject:
		points = [[self.e_distance,0,0],[-16,0,0]],[[0,14,0],[0,self.e_distance,0]],[[0,0,self.e_distance],[0,0,14]]
		center = [0,0,0]

		shell1 = Shell(points[0][0],points[0][1])
		shell2 = Shell(points[1][0],points[1][1])
		cutout1 = Cutout(points[0][0],points[0][1],[0,1,1,0,0,0,0,0],[1,0])
		cutout2 = Cutout(points[1][0],points[1][1],[0,0,0,0,1,1,0,0],[0,1])

		gusset2 = Gusset(points[1][0],points[1][1],center,points[0][0])

		a = Fittings.merge_everything(self)
		a = Manip.balance_on_corner_and_cutoff(a)

		return a

	def cross(self) -> OpenSCADObject:
		points = [[[-16,0,0],[self.e_distance,0,0]],[[0,-16,0],[0,self.e_distance,0]]]
		shell1 = Shell(points[0][0],points[0][1]) 
		shell2 = Shell(points[1][0],points[1][1])
		cutout1 = Cutout(points[0][0],points[0][1],[0,0,0,0,1,1,1,1],[1,1])
		cutout2 = Cutout(points[1][0],points[1][1],[0,0,0,0,1,1,1,1],[1,1])
		gusset1 = Gusset(points[0][0],points[0][1],points[1][0],points[1][1])

		a = Fittings.merge_everything(self)
		a = Manip.balance_on_edge_and_cutoff(a)
		return a

	def tube(self) -> OpenSCADObject:
		points = [[[-self.e_distance,0,0],[self.e_distance,0,0]]]
		shell1 = Shell(points[0][0],points[0][1]) 
		cutout1 = Cutout(points[0][0],points[0][1],[1,1,1,1,1,1,1,1],[1,1])

		a = Fittings.merge_everything(self)
		return a

	def one_end_tube(self) -> OpenSCADObject:
		points = [[[-self.e_distance,0,0],[self.e_distance,0,0]]]
		shell1 = Shell(points[0][0],points[0][1]) 
		cutout1 = Cutout(points[0][0],points[0][1],[0,0,0,0,1,1,1,1],[1,1])

		a = Fittings.merge_everything(self)
		return a

	def offset_cross(self) -> OpenSCADObject:
		points = [[[-16,0,15],[self.e_distance,0,15]],[[0,-16,-15],[0,self.e_distance,-15]]]
		shell1 = Shell(points[0][0],points[0][1]) 
		shell2 = Shell(points[1][0],points[1][1])
		cutout1 = Cutout(points[0][0],points[0][1],[0,0,0,0,1,1,1,1],[1,1])
		cutout2 = Cutout(points[1][0],points[1][1],[0,0,0,0,1,1,1,1],[1,1])
		gusset1 = Gusset(points[0][0],points[0][1],points[1][0],points[1][1])

		a = Fittings.merge_everything(self)
		a = Manip.balance_on_edge_and_cutoff(a)
		return a

	def tee(self) -> OpenSCADObject:
		points = [[[-self.e_distance,0,20],[self.e_distance,0,20]],[[0,15,20],[0,self.e_distance,20]]]
		shell1 = Shell(points[0][0],points[0][1])
		shell2 = Shell(points[1][0],points[1][1])
		cutout1 = Cutout(points[0][0],points[0][1],[1,0,1,1,1,0,1,1],[1,1])
		cutout2 = Cutout(points[1][0],points[1][1],[0,0,0,0,1,1,1,1],[0,1])
		gusset1 = Gusset(points[0][0],points[0][1],points[1][0],points[1][1])
	
		a = Fittings.merge_everything(self)
		return a

	def ell(self) -> OpenSCADObject:
		points = [[[-20,0,20],[self.e_distance,0,20]],[[0,15,20],[0,self.e_distance,20]]]
		shell1 = Shell(points[0][0],points[0][1])
		shell2 = Shell(points[1][0],points[1][1])
		cutout1 = Cutout(points[0][0],points[0][1],[0,0,0,0,0,0,1,1],[1,1])
		cutout2 = Cutout(points[1][0],points[1][1],[0,0,0,0,0,1,1,0],[0,1])
		gusset1 = Gusset(points[0][0],points[0][1],points[1][0],points[1][1])
	
		a = Fittings.merge_everything(self)
		a = Manip.balance_on_edge_and_cutoff(a)
		return a

	def merge_everything(self) -> OpenSCADObject:
		a = Shell.union_all_shells()
		a += Gusset.union_all_gussets()
		a -= Cutout.union_all_cutouts()
		return a

if __name__ == "__main__":
	out_dir = sys.argv[1] if len(sys.argv) > 1 else Path(__file__).parent

	f = Fittings(40)
	# a = f.tube()
	# a = f.cross()
	# a = f.offset_cross()
	# a = f.tee()
	a = f.ell()
	# a = f.corner_three_way()
	# a = f.corner_two_way()
	# a = f.corner_two_way_diag()

	file_out = scad_render_to_file(a,  out_dir=out_dir)
	print(f"{__file__}: SCAD file written to: \n{file_out}") 
 
************************************************/
